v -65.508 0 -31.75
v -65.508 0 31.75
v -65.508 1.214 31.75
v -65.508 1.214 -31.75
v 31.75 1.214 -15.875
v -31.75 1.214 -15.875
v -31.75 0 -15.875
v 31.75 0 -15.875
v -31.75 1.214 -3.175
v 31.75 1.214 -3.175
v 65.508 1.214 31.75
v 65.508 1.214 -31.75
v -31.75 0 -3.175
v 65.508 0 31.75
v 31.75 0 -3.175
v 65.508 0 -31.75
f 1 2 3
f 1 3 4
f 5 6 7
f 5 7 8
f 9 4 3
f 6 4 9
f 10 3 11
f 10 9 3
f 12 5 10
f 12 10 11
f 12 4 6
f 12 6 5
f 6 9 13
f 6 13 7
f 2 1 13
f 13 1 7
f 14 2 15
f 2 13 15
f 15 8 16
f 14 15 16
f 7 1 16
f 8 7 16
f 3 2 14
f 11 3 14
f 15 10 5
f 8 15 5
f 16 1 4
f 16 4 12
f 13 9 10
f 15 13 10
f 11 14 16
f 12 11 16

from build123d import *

# Parameters (mm, degrees)
SKETCH1_W           = 131.01574
SKETCH1_H           = 63.5
BOSS_EXTRUDE1_DEPTH = 1.21412
SKETCH2_W           = 63.5
SKETCH2_H           = 12.7
CUT_EXTRUDE1_DEPTH  = 2.21412


with BuildPart() as part:
    # Sketch1 → Boss-Extrude1 (new body)
    with BuildSketch(Plane(origin=(0, 0, 0), x_dir=(1, 0, 0), z_dir=(0, 1, 0))):
        Rectangle(SKETCH1_W, SKETCH1_H)
    extrude(amount=BOSS_EXTRUDE1_DEPTH)

    # Sketch2 → Cut-Extrude1 (cut, through all)
    with BuildSketch(Plane(origin=(0, 1.21412, 0), x_dir=(1, 0, 0), z_dir=(0, 1, 0))):
        with Locations((0, 9.525)):
            Rectangle(SKETCH2_W, SKETCH2_H)
    extrude(amount=-CUT_EXTRUDE1_DEPTH, mode=Mode.SUBTRACT)


solid = part.part
